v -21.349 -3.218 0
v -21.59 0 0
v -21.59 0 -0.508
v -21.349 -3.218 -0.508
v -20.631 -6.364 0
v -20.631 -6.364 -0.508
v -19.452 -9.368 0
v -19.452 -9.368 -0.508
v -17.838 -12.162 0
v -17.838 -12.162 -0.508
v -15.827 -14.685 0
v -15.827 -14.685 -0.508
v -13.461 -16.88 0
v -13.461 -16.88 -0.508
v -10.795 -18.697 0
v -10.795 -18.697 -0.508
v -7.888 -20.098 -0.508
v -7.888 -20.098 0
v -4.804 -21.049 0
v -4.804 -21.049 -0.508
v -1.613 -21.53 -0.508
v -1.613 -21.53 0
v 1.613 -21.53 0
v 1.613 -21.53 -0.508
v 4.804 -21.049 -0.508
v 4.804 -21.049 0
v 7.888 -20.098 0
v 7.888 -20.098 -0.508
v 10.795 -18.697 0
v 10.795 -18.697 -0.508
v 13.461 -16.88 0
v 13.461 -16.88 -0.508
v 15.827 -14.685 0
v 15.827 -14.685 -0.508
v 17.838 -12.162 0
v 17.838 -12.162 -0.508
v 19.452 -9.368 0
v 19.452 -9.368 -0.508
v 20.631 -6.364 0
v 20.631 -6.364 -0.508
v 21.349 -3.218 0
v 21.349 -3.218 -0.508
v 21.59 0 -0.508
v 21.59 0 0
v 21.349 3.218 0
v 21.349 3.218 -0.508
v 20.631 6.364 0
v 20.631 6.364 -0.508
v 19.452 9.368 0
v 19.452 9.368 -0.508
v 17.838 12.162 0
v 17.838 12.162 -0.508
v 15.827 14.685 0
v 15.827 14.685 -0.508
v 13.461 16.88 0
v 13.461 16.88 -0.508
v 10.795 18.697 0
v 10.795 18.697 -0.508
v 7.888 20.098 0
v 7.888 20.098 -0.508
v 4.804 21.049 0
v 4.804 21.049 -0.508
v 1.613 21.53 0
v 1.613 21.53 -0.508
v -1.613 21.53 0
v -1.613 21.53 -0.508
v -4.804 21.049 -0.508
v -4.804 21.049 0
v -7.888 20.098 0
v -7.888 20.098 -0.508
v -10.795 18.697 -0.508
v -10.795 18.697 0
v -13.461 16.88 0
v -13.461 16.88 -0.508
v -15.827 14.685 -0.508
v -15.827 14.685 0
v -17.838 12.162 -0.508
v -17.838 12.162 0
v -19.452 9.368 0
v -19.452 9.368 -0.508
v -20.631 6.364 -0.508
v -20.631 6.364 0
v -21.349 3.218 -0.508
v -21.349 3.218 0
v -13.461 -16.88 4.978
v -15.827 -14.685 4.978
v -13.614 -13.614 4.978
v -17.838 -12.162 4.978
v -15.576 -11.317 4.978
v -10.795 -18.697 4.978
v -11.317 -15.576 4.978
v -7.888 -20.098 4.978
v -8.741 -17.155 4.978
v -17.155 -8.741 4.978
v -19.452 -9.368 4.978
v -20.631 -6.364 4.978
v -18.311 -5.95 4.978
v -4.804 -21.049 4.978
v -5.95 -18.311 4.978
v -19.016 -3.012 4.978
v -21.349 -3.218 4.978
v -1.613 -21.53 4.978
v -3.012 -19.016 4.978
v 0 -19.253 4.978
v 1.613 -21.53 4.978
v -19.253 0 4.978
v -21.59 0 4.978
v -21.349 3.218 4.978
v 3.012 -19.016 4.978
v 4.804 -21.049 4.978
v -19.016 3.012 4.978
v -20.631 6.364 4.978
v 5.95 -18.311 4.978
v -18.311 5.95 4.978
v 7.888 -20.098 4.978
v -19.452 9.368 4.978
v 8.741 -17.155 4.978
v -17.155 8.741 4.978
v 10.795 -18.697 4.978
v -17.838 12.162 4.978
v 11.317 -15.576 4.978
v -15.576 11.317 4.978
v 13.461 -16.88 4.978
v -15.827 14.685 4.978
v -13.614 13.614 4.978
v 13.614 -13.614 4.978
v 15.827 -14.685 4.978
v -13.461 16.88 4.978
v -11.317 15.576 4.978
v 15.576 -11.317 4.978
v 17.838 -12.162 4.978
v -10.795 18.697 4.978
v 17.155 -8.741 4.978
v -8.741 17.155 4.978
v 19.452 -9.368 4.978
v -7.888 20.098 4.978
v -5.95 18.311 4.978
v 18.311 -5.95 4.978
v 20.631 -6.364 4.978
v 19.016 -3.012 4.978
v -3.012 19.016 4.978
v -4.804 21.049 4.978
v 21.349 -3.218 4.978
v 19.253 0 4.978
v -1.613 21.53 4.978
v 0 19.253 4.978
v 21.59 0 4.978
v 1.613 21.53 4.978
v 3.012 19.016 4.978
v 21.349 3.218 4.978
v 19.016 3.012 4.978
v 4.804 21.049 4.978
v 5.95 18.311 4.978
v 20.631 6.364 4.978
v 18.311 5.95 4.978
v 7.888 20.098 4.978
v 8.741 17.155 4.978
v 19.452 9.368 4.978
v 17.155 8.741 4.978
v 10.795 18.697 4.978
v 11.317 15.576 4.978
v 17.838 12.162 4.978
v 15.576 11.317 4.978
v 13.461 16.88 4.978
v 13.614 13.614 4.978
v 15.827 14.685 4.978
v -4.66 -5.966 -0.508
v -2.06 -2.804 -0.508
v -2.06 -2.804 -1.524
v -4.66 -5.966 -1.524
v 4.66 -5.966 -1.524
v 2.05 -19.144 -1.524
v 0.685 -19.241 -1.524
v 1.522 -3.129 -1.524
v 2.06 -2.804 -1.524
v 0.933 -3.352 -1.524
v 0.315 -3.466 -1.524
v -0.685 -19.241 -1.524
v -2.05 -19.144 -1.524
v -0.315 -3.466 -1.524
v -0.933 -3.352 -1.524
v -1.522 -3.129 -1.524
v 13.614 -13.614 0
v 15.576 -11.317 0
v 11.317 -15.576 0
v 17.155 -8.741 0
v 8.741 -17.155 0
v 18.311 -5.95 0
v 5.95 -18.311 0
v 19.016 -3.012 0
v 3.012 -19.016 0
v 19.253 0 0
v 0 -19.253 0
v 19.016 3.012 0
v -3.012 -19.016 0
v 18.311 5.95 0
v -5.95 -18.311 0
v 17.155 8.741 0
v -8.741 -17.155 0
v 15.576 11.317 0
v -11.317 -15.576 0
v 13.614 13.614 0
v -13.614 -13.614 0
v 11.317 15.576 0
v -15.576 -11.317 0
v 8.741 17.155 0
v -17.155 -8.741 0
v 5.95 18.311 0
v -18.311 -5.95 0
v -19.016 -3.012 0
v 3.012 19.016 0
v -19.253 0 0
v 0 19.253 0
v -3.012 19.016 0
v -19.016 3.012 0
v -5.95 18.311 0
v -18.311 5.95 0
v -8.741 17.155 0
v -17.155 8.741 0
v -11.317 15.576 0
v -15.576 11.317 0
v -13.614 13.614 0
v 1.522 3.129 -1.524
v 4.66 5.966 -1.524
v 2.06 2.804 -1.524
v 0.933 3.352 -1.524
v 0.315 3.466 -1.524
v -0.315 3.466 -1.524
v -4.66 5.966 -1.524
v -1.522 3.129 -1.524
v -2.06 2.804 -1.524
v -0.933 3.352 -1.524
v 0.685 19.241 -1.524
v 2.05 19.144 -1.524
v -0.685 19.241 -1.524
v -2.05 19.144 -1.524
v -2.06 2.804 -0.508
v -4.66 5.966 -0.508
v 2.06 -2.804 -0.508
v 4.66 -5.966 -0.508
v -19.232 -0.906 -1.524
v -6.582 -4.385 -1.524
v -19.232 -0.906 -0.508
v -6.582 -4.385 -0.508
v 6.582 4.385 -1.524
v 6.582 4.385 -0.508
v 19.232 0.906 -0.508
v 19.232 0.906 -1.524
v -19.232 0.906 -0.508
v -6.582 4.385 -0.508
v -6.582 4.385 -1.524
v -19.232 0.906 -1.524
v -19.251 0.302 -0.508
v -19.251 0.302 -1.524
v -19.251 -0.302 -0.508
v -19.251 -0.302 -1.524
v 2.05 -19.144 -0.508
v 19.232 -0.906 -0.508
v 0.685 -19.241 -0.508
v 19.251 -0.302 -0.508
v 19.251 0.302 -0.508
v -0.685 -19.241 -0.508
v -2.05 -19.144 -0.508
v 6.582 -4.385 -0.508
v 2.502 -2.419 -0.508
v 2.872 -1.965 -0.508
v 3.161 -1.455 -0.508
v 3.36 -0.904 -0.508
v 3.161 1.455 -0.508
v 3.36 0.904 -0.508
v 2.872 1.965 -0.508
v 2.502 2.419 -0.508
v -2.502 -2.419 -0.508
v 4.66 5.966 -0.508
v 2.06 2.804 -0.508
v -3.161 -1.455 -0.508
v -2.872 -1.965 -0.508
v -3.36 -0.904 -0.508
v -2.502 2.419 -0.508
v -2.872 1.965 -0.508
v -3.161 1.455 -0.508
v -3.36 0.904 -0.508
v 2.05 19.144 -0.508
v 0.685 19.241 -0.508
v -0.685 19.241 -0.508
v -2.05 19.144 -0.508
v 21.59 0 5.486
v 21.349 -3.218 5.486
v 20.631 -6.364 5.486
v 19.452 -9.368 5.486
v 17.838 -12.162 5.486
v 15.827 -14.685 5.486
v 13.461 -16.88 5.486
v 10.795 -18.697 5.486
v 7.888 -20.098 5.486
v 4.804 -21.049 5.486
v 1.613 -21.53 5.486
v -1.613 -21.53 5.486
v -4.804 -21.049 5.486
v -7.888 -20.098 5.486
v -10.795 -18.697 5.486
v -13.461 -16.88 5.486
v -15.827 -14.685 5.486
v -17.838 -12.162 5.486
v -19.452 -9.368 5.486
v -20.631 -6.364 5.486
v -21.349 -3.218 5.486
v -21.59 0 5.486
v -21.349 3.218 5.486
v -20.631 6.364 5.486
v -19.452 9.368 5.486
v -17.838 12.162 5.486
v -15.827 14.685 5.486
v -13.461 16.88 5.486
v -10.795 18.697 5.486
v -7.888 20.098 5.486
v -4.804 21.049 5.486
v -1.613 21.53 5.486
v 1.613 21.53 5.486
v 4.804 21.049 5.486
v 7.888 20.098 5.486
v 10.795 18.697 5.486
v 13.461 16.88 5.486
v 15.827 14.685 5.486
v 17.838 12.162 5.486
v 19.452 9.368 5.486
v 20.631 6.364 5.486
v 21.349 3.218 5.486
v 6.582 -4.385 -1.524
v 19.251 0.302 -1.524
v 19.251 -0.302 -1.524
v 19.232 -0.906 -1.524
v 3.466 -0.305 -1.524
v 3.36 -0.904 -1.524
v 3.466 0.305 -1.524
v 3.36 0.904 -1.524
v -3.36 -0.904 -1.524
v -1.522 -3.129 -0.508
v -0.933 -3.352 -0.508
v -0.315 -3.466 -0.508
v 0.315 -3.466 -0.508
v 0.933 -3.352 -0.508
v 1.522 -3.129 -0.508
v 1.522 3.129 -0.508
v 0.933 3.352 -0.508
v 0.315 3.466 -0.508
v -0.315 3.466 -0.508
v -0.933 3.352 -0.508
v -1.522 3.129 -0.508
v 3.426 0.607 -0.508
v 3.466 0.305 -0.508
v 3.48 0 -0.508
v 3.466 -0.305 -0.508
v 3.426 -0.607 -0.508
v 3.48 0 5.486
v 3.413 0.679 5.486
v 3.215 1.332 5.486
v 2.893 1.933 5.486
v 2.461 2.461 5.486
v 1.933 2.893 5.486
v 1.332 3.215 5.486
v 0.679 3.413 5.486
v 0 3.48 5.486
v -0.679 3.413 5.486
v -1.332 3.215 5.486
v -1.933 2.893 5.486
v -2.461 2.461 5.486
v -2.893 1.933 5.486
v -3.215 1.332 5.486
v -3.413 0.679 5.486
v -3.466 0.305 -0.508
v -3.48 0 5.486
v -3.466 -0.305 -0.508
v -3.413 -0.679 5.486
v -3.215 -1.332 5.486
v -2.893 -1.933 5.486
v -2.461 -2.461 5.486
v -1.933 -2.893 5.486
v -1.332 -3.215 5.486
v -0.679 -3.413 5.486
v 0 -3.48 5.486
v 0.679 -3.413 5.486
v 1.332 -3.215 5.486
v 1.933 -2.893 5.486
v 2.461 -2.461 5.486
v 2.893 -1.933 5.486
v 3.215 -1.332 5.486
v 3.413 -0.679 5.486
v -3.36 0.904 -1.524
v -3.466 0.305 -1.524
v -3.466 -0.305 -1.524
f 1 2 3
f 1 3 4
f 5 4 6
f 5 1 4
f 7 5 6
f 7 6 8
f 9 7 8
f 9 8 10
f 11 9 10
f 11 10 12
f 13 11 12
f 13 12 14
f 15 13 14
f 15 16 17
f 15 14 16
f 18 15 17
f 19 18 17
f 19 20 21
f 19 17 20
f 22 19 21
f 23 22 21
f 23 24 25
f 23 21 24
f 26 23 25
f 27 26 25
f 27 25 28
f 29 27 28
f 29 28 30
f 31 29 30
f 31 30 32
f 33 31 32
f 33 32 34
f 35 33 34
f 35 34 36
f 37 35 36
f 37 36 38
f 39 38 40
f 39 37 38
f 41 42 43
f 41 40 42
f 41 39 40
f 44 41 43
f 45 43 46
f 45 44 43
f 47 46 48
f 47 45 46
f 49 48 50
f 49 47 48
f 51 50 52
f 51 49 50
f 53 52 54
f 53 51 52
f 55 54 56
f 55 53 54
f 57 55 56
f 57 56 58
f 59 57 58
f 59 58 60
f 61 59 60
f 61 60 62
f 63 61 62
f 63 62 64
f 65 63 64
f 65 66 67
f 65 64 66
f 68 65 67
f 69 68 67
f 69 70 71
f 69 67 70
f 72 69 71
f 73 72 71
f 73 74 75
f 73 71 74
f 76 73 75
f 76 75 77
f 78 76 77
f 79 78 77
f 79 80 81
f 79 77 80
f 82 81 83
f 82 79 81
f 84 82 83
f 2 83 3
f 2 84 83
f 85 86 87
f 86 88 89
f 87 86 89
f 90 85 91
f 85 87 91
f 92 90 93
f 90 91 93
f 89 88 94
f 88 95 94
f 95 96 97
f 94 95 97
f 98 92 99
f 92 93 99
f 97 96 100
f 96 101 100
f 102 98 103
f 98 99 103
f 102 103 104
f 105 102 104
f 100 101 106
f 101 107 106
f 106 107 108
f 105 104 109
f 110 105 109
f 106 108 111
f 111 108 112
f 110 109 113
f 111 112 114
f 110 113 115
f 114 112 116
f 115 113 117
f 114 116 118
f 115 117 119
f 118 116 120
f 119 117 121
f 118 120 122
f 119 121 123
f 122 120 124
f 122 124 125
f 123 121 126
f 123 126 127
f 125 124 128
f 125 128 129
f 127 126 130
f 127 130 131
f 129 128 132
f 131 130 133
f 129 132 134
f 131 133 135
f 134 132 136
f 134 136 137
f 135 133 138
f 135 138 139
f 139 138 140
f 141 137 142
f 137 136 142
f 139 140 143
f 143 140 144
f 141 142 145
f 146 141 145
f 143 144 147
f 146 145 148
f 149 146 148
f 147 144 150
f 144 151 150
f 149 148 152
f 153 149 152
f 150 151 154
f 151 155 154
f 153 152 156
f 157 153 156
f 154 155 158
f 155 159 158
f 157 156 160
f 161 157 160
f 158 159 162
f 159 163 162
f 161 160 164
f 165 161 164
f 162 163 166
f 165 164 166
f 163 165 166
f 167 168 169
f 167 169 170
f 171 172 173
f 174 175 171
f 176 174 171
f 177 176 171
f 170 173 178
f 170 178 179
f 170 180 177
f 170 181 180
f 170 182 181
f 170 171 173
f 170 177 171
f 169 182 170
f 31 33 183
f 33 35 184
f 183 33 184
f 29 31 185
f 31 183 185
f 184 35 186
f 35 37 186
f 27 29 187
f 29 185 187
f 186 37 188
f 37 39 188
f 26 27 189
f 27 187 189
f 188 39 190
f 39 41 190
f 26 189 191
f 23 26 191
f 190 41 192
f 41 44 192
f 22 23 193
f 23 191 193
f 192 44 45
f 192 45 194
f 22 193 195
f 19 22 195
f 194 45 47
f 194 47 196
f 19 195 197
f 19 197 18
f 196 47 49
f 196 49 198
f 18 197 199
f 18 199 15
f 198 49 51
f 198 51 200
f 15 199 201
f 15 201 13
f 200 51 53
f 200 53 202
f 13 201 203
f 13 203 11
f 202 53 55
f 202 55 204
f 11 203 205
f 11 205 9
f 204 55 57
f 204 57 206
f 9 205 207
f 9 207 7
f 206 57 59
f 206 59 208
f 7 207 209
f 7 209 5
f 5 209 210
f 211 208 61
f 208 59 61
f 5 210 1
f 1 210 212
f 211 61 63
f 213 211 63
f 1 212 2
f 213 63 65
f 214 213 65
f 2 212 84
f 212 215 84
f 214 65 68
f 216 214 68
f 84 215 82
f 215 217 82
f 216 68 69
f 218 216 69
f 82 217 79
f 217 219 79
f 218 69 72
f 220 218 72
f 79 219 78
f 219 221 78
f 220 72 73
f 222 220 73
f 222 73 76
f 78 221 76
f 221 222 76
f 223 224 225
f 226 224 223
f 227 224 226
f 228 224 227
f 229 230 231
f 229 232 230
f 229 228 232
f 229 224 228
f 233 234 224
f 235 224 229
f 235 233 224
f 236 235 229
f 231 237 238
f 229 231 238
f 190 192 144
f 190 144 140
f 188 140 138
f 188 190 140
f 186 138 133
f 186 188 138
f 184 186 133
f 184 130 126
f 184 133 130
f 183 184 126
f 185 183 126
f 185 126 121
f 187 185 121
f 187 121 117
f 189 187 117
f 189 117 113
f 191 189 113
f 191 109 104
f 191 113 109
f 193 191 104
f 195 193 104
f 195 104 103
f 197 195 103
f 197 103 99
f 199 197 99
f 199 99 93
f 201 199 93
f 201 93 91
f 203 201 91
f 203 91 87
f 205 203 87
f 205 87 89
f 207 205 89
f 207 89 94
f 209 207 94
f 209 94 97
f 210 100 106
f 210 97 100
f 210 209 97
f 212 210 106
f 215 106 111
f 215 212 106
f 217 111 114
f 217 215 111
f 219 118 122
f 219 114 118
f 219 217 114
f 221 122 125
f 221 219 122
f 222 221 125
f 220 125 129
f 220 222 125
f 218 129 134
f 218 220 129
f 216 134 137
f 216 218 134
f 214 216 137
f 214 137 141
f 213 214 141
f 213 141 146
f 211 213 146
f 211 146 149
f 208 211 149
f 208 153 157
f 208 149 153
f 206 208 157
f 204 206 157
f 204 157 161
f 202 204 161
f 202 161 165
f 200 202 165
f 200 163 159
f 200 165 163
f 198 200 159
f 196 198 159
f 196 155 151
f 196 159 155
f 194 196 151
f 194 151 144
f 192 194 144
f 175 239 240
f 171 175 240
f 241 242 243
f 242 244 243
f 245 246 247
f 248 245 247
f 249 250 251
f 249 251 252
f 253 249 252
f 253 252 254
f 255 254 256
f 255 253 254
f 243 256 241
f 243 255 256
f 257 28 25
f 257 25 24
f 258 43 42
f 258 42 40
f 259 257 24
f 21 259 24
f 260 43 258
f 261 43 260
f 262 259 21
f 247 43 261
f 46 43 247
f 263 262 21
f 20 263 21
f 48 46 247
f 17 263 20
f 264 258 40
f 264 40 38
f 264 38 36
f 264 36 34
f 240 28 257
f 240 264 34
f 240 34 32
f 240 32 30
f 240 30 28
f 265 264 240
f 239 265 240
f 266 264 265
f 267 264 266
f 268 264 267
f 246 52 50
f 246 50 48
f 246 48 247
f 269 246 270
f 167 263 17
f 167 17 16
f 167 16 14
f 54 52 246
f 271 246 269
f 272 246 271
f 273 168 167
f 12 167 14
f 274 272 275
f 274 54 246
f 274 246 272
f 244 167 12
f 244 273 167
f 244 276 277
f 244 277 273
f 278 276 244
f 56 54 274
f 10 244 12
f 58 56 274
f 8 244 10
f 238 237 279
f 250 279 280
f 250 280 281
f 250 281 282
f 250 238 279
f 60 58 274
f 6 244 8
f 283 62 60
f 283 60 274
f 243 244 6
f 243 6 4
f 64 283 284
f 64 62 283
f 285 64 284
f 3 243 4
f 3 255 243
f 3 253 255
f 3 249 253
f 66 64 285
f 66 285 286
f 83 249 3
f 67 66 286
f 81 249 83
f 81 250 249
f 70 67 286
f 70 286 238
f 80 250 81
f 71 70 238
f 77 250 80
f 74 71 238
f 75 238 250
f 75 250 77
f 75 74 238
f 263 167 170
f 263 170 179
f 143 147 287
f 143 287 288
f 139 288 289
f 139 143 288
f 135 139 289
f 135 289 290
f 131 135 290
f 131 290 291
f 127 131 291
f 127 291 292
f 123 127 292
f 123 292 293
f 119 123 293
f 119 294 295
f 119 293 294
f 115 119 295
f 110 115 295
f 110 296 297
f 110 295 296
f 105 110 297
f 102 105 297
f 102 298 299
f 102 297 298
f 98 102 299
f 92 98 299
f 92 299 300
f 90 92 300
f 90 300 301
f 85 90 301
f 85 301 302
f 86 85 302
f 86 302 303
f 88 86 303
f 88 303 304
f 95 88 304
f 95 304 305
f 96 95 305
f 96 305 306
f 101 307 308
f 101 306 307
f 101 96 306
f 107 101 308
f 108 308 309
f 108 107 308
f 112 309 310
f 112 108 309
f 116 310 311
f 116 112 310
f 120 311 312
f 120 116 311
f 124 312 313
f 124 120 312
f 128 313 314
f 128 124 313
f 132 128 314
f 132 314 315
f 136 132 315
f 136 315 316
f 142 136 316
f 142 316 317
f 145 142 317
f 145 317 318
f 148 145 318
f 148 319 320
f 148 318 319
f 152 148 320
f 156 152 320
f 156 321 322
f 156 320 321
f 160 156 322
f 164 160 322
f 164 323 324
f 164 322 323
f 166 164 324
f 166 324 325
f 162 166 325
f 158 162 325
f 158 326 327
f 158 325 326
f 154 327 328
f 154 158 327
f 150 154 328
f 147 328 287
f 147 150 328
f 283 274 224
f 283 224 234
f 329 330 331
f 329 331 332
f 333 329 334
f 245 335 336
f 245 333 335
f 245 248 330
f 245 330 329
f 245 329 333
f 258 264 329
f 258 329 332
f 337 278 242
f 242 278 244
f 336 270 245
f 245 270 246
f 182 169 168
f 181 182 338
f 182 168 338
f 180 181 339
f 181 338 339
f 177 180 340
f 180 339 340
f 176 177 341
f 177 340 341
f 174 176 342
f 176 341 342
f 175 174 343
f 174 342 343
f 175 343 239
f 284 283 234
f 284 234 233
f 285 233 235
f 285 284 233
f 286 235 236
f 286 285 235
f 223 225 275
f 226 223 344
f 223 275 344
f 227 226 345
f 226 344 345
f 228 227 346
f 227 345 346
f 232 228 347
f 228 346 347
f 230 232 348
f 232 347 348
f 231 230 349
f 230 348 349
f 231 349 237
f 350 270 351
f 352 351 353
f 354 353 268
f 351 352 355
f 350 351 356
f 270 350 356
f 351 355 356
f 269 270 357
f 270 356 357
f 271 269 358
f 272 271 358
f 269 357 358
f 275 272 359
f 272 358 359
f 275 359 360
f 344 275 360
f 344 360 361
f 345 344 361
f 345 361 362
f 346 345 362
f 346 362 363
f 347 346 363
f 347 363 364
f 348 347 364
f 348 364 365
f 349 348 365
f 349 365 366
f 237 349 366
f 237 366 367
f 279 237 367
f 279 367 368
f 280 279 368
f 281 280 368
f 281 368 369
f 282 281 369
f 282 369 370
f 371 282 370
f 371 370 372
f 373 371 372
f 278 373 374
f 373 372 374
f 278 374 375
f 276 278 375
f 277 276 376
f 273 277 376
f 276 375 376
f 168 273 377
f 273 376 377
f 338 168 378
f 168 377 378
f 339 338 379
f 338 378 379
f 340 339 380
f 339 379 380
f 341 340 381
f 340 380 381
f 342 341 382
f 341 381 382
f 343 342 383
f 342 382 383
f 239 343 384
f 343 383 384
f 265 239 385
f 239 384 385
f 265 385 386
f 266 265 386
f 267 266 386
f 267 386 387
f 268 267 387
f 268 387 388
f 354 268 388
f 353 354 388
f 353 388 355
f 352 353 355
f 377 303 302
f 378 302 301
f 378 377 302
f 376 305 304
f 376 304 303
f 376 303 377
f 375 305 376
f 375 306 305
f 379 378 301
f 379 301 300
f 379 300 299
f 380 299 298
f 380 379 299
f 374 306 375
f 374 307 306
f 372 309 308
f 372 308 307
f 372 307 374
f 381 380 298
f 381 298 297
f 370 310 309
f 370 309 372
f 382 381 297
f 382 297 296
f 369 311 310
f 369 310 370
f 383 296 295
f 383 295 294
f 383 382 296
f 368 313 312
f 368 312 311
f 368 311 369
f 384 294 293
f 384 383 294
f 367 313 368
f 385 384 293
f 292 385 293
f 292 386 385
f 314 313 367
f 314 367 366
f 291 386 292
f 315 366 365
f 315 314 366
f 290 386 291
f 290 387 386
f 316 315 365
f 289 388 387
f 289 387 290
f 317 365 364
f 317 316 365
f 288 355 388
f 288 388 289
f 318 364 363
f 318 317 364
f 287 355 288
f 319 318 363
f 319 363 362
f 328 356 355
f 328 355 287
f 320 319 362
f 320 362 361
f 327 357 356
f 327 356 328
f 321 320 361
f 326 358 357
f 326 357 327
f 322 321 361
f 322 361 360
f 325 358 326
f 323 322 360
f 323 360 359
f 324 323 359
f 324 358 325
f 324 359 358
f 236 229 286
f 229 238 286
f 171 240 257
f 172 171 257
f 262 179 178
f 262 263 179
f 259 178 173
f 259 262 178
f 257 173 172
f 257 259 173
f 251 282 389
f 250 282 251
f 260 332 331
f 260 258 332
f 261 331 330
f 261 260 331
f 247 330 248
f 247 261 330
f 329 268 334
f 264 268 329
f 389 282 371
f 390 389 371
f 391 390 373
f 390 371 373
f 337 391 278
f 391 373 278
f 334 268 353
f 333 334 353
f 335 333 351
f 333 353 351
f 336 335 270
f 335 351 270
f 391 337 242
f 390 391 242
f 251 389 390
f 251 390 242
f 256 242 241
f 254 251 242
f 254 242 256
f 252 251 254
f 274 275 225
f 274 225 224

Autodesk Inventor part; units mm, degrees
ref_plane "YZ Plane" through (0, 0, 0) normal (1, 0, 0) x (0, 1, 0)
ref_plane "XZ Plane" through (0, 0, 0) normal (0, 1, 0) x (-1, 0, 0)
ref_plane "XY Plane" through (0, 0, 0) normal (0, 0, 1) x (1, 0, 0)
sketch "Sketch1" plane through (0, 0, 0) normal (0, 0, 1) x (1, 0, 0)
  circle A0 centre (0, 0) radius 19.2532
  dimension "d0" = 38.5064
extrude "Extrusion1" add sketch "Sketch1" along normal blind 4.9784
sketch "Sketch11" plane through (0, 0, 4.9784) normal (0, 0, 1) x (1, 0, 0)
  circle A0 centre (0, 0) radius 21.59
  dimension "d30" = 43.18
extrude "Extrusion8" add sketch "Sketch11" along normal blind 0.508
sketch "Sketch12" plane through (0, 0, 0) normal (0, 0, -1) x (-1, 0, 0)
  circle A0 centre (0, 0) radius 21.59
extrude "Extrusion9" add sketch "Sketch12" along normal blind 0.508
sketch "Sketch13" plane through (0, 0, 5.4864) normal (0, 0, 1) x (1, 0, 0)
  circle A0 centre (0, 0) radius 3.4798
  dimension "d35" = 6.9596
extrude "Extrusion10" cut sketch "Sketch13" against normal through all
sketch "Sketch14" plane through (0, 0, -0.508) normal (0, 0, -1) x (-1, 0, 0)
  line L0 (-2.0603, -2.8043) -> (-4.6601, -5.9659)
  line L1 (-4.6601, -5.9659) -> (-2.0502, -19.1437)
  line L2 (2.0603, -2.8043) -> (4.6601, -5.9659)
  line L3 (4.6601, -5.9659) -> (2.0502, -19.1437)
  line L4 (-2.0603, 2.8043) -> (-4.6601, 5.9659)
  line L5 (-4.6601, 5.9659) -> (-2.0502, 19.1437)
  line L6 (4.6601, 5.9659) -> (2.0502, 19.1437)
  line L7 (2.0603, 2.8043) -> (4.6601, 5.9659)
  line L8 (3.3602, -0.9044) -> (6.5825, -4.3851)
  line L9 (6.5825, -4.3851) -> (19.2319, -0.9059)
  line L10 (3.3602, 0.9044) -> (6.5825, 4.3851)
  line L11 (6.5825, 4.3851) -> (19.2319, 0.9059)
  line L12 (-3.3602, -0.9044) -> (-6.5825, -4.3851)
  line L13 (-6.5825, -4.3851) -> (-19.2319, -0.9059)
  line L14 (-6.5825, 4.3851) -> (-19.2319, 0.9059)
  line L15 (-3.3602, 0.9044) -> (-6.5825, 4.3851)
  arc A0 (2.0502, 19.1437) -> (-2.0502, 19.1437) centre (0, 0) ccw
  arc A1 (-19.2319, 0.9059) -> (-19.2319, -0.9059) centre (0, 0) ccw
  arc A2 (-2.0502, -19.1437) -> (2.0502, -19.1437) centre (0, 0) ccw
  arc A3 (19.2319, -0.9059) -> (19.2319, 0.9059) centre (0, 0) ccw
  arc A4 (-2.0603, -2.8043) -> (2.0603, -2.8043) centre (0, 0) ccw
  arc A5 (-3.3602, 0.9044) -> (-3.3602, -0.9044) centre (0, 0) ccw
  arc A6 (3.3602, -0.9044) -> (3.3602, 0.9044) centre (0, 0) ccw
  arc A7 (2.0603, 2.8043) -> (-2.0603, 2.8043) centre (0, 0) ccw
extrude "Extrusion11" add sketch "Sketch14" along normal blind 1.016
sketch "Sketch15" plane through (0, 0, -0.508) normal (0, 0, -1) x (-1, 0, 0)
  circle A0 centre (0, 0) radius 3.4798 projected
  line L0 (4.6601, -5.9659) -> (2.0502, -19.1437) projected
  line L1 (2.4217, -17.2678) -> (2.0502, -19.1437)
properties part number "mcdave_wheel"
